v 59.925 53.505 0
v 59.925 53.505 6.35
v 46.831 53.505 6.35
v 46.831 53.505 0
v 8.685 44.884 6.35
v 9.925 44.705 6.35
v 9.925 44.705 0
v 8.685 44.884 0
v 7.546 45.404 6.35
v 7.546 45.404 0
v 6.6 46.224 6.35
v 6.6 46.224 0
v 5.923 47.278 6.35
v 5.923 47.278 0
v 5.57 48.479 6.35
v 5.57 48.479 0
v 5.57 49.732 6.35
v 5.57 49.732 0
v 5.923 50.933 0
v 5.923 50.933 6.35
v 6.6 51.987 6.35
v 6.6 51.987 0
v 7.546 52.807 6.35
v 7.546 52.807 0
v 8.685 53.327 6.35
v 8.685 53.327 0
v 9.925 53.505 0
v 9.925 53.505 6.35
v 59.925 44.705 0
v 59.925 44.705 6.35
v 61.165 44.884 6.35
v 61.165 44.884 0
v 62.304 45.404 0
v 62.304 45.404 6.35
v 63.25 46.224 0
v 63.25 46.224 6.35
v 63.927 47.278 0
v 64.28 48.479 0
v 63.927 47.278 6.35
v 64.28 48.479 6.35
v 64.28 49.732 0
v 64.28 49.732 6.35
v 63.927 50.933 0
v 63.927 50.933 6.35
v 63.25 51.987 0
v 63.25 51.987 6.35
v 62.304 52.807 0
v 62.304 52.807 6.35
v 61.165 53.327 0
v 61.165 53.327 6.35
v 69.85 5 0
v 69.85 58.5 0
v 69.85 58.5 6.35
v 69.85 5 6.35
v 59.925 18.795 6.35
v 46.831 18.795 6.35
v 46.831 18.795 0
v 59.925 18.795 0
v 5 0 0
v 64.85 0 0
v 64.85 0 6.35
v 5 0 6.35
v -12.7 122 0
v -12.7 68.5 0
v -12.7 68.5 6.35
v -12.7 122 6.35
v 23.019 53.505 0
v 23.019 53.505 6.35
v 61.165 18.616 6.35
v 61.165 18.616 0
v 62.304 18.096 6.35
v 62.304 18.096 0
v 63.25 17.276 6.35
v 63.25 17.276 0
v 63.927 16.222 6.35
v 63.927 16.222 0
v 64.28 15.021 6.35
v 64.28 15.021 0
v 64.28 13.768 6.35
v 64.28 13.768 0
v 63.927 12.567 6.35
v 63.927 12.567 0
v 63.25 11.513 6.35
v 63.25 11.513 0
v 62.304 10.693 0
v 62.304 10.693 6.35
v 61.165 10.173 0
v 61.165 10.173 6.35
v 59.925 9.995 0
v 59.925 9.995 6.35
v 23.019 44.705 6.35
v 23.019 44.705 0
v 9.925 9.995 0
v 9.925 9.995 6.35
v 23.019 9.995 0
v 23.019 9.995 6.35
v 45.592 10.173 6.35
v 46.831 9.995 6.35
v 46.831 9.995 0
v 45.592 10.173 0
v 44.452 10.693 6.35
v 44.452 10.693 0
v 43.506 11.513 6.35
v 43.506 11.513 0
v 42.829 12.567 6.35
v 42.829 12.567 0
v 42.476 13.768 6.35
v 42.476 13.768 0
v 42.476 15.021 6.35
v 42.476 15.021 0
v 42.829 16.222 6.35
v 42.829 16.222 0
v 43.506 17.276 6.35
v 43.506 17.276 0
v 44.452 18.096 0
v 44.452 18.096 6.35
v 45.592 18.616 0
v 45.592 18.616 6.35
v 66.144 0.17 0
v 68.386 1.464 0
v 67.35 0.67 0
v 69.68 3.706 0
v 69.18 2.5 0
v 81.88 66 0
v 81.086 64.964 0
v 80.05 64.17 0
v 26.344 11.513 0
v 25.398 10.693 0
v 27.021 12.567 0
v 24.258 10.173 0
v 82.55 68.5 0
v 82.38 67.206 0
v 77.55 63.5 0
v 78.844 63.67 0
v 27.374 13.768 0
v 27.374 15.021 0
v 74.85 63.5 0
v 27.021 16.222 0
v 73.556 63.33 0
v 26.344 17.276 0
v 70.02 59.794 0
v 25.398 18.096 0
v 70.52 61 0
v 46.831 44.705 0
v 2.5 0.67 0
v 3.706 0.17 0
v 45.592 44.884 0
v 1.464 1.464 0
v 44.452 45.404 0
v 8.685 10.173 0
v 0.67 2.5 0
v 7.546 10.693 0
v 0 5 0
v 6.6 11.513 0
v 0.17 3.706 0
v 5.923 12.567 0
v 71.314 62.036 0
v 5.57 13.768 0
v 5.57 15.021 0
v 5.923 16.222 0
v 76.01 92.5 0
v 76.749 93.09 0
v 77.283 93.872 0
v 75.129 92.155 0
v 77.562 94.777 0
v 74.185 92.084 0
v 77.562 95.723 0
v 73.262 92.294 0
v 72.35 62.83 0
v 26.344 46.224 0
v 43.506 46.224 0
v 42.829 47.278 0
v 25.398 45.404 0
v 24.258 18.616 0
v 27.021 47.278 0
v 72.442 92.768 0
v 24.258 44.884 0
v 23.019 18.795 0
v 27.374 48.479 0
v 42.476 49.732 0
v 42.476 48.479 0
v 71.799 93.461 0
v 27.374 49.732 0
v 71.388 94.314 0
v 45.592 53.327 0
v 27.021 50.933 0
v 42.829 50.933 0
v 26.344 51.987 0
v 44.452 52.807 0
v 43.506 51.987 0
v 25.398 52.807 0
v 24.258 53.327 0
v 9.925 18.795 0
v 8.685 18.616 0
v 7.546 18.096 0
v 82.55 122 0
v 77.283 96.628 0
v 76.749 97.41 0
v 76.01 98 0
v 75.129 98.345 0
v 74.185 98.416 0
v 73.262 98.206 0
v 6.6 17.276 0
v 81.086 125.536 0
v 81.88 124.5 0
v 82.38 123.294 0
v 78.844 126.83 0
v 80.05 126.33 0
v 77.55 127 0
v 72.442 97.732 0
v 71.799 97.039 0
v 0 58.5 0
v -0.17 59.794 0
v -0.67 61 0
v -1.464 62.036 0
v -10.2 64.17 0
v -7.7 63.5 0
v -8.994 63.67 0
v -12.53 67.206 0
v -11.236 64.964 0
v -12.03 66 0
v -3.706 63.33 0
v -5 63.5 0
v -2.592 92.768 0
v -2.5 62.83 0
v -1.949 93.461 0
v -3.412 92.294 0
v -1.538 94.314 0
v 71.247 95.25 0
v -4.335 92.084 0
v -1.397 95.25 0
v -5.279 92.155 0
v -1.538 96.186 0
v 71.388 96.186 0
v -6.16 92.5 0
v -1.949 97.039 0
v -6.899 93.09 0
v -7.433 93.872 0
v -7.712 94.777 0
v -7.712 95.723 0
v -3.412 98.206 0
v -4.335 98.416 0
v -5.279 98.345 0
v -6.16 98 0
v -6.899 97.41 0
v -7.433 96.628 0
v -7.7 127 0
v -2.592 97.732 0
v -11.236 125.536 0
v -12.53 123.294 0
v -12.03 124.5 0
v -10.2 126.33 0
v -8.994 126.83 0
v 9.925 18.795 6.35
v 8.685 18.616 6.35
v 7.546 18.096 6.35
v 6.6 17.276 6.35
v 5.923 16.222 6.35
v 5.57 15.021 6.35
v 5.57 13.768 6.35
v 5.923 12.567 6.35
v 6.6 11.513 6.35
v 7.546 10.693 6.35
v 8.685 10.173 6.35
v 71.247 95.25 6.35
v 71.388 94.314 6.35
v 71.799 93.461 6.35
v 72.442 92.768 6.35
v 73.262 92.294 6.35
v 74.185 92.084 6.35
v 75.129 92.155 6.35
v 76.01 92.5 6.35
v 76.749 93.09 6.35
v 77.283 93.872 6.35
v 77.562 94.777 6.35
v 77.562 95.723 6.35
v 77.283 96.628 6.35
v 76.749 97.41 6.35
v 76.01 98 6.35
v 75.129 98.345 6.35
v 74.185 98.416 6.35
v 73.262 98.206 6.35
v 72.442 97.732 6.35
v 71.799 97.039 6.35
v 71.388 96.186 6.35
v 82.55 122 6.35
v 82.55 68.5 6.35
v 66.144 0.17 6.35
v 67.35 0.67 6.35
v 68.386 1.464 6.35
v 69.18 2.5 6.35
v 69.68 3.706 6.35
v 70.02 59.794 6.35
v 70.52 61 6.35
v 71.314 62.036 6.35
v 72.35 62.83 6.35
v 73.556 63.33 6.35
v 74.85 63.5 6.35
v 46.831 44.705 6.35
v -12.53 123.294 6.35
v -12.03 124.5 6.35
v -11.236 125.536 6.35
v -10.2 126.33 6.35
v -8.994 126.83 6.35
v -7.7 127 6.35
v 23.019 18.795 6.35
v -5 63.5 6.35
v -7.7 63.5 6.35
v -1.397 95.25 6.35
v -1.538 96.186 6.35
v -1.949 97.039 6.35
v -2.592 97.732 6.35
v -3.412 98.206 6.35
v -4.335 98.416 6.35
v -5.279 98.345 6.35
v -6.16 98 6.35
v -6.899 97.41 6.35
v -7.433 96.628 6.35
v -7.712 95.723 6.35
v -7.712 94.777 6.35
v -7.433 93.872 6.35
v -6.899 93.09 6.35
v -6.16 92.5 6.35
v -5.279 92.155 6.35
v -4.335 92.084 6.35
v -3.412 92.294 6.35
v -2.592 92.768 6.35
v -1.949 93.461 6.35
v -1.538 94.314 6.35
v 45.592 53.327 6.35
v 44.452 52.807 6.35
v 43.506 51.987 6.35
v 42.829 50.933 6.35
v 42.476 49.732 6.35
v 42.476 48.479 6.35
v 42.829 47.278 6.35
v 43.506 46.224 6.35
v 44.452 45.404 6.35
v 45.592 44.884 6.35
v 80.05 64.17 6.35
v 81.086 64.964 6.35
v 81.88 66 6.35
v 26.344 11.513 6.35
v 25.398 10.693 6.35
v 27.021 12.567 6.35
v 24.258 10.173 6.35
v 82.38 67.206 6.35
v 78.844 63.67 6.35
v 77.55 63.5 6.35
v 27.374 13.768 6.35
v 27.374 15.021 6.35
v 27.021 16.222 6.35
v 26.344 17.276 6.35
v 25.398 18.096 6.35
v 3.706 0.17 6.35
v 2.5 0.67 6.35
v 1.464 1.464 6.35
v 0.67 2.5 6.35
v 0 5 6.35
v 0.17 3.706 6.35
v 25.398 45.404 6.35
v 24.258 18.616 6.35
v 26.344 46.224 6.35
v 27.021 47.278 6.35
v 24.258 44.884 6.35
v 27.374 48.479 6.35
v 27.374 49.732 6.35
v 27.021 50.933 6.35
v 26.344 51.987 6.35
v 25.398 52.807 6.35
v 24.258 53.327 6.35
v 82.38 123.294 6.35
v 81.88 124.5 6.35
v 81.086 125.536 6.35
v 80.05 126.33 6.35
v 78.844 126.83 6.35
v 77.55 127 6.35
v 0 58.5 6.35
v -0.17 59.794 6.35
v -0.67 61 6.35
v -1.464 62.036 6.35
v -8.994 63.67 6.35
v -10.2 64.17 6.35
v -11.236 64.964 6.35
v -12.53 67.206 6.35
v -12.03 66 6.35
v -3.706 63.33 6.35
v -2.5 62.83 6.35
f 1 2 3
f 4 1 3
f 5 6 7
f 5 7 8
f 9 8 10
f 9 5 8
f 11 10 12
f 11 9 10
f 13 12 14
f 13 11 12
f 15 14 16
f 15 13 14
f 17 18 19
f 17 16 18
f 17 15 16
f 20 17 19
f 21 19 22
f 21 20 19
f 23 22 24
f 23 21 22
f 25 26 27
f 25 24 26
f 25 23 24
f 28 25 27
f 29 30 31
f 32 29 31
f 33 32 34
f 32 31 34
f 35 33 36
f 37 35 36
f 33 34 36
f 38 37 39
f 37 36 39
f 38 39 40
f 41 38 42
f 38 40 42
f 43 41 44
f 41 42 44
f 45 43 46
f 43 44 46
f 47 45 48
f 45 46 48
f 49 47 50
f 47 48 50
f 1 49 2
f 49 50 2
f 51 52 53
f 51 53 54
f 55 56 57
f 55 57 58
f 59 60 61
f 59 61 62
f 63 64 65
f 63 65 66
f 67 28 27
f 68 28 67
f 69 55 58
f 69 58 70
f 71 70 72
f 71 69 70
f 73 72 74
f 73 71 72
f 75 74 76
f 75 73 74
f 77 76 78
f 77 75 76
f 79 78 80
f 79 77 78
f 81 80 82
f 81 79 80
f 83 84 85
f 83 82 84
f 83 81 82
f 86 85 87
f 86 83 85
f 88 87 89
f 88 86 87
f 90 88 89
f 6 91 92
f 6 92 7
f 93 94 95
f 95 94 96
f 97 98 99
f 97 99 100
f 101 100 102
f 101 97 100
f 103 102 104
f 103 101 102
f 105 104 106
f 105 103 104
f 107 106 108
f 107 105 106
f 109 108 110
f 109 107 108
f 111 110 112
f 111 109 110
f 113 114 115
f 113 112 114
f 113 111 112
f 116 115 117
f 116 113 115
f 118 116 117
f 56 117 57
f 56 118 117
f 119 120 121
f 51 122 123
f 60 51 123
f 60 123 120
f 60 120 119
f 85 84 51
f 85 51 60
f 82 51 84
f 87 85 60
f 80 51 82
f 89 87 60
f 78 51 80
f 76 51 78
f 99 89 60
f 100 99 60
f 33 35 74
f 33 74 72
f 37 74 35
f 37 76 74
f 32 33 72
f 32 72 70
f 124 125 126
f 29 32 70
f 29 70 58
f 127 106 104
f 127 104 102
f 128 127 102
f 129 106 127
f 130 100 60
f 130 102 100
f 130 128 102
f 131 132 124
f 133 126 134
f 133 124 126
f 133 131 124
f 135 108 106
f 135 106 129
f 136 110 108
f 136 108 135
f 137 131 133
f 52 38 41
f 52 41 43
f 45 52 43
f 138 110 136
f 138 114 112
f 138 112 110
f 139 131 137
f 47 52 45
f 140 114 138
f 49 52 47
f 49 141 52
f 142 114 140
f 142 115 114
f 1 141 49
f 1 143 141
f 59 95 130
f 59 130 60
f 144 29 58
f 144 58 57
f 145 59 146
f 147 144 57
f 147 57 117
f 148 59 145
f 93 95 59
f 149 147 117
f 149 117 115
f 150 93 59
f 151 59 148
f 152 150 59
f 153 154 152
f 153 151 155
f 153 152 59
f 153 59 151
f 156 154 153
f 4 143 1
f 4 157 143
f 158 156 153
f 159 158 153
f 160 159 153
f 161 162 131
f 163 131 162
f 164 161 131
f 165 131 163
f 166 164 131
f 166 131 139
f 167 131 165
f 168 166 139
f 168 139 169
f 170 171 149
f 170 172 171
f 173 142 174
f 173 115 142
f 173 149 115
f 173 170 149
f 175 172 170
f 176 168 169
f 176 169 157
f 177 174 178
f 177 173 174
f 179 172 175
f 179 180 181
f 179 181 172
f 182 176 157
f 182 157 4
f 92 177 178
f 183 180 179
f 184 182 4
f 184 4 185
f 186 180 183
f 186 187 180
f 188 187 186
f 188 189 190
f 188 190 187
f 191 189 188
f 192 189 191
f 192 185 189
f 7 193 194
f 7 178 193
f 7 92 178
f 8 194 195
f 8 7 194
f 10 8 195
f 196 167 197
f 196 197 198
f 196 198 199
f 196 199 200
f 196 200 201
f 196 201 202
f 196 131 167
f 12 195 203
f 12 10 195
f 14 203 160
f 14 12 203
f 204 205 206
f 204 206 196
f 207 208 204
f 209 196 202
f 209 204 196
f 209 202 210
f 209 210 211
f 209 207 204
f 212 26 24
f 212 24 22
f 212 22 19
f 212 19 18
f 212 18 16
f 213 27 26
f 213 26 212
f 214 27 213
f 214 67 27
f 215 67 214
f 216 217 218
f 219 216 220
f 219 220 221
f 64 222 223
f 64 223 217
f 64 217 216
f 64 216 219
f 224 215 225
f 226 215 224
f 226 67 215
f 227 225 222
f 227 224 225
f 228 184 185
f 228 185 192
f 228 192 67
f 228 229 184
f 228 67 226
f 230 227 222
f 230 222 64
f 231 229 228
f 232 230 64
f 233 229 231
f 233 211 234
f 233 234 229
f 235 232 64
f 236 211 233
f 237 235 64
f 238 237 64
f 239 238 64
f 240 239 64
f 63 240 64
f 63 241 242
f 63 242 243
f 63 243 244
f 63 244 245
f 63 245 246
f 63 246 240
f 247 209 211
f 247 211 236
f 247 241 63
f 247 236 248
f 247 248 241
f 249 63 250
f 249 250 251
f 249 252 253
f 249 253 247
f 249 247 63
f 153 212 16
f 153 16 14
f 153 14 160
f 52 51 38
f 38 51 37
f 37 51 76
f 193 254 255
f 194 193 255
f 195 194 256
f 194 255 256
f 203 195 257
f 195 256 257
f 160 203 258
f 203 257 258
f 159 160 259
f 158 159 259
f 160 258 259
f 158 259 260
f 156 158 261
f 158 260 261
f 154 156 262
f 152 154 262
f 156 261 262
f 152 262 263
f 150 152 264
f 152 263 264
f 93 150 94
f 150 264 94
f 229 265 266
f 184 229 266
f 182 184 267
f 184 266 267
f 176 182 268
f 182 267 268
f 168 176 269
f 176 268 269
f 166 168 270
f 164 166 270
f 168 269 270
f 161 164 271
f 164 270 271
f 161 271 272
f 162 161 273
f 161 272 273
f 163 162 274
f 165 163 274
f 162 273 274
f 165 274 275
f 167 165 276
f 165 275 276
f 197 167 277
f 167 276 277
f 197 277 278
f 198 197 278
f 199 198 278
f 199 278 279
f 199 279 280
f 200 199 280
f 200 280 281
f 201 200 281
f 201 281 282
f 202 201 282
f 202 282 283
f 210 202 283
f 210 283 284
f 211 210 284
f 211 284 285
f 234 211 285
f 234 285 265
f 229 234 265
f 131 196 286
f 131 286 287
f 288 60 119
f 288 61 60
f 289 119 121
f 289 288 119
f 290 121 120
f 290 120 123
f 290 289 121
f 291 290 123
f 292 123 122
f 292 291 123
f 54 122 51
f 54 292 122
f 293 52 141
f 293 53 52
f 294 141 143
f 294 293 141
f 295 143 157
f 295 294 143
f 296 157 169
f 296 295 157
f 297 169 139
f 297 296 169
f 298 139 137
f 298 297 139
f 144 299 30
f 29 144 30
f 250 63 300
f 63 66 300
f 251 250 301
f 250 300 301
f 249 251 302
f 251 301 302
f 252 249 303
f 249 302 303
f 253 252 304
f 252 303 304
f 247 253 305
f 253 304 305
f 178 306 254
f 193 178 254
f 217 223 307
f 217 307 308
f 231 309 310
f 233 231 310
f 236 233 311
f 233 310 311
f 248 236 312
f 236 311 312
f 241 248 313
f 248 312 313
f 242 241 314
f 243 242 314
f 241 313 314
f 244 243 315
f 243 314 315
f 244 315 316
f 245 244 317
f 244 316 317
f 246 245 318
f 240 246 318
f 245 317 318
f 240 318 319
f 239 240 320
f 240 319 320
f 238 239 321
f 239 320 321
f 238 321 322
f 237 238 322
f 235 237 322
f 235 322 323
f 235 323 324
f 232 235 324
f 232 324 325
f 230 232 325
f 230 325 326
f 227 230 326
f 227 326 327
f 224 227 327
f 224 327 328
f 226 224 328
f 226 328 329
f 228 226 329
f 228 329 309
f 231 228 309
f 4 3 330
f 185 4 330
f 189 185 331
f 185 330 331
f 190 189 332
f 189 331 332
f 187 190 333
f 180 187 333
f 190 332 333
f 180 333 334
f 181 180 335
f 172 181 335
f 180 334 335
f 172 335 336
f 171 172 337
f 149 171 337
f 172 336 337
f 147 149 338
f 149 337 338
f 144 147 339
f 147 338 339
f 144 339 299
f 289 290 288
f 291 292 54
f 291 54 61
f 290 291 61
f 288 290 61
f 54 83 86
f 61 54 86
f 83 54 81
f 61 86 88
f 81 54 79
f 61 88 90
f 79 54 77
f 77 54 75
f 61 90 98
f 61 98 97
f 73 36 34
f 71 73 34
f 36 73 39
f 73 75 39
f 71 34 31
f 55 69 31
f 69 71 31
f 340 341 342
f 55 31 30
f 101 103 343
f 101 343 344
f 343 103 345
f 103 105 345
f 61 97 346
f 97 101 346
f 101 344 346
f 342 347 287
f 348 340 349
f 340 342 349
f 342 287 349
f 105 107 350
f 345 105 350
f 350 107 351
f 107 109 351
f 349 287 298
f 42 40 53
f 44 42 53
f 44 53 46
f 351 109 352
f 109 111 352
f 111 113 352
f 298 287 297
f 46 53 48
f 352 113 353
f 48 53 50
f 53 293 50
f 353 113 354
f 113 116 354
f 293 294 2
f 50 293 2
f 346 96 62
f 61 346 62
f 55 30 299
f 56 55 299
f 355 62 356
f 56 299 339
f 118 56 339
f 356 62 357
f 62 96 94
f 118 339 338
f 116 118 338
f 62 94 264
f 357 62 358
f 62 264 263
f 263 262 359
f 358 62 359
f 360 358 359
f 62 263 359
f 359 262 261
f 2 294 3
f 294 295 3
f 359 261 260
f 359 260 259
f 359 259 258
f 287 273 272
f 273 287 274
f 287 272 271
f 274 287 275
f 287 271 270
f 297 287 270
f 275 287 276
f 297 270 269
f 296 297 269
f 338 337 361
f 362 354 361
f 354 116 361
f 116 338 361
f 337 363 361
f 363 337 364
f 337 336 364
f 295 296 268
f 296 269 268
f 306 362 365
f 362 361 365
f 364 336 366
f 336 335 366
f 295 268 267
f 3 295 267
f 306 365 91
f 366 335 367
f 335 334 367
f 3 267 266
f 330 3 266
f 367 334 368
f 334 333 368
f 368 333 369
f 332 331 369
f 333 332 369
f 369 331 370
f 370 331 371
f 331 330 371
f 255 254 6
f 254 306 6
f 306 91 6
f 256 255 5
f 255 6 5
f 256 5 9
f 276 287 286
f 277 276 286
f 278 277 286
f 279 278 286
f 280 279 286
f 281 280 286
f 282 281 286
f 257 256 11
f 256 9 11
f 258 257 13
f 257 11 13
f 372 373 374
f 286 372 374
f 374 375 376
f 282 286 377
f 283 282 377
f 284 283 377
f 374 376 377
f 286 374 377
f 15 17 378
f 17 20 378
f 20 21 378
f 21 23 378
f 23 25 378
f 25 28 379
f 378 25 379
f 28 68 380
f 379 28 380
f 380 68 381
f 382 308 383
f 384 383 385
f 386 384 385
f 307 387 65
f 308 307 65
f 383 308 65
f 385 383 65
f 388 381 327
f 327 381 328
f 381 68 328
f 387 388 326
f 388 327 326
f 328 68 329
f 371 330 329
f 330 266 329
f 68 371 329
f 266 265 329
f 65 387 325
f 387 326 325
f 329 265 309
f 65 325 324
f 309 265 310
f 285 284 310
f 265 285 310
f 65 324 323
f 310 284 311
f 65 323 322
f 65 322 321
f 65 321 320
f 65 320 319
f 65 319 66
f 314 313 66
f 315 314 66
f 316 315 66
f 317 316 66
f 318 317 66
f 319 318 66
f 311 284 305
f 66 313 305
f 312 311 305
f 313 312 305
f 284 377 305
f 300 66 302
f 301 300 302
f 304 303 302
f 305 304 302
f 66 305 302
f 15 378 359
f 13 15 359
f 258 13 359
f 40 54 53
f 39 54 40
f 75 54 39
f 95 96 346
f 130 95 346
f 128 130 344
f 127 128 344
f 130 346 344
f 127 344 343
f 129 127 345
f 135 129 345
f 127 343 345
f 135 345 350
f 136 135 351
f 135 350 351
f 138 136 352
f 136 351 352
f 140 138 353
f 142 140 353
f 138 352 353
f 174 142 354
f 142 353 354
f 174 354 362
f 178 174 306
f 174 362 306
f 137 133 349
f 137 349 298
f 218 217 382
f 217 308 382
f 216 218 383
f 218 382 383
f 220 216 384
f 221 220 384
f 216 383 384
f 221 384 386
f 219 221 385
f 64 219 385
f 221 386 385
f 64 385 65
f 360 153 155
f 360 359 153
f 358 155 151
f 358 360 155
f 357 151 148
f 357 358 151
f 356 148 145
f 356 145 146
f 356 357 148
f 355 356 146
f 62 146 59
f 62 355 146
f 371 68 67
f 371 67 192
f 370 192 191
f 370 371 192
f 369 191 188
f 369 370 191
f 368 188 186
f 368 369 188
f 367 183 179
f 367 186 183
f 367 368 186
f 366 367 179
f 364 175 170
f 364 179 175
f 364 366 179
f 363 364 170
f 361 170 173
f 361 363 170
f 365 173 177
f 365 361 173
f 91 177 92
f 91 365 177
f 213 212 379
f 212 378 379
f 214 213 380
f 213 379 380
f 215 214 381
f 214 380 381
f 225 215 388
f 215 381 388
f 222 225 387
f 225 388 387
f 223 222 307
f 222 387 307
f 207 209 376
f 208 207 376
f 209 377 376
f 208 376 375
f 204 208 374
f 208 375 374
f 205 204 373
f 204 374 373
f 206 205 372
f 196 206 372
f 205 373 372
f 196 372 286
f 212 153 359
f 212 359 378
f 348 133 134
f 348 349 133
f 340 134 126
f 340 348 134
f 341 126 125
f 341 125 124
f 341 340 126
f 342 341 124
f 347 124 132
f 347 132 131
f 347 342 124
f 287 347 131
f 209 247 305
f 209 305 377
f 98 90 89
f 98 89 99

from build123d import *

# Parameters (mm, degrees)
BOSS_EXTRUDE1_DEPTH = 6.35
CUT_EXTRUDE1_REACH  = 153.604
SKETCH2_R           = 3.175
CUT_EXTRUDE2_REACH  = 153.604
FILLET1_R           = 5


with BuildPart() as part:
    # Sketch1 → Boss-Extrude1 (new body)
    with BuildSketch(Plane.XY):
        Polygon((0, 0), (0, 63.5), (-12.7, 63.5), (-12.7, 127), (82.55, 127), (82.55, 63.5), (69.85, 63.5), (69.85, 0), align=None)
    extrude(amount=BOSS_EXTRUDE1_DEPTH)

    # Sketch2 → Cut-Extrude1 (cut, up to next)
    with BuildSketch(Plane.XY.offset(6.35), mode=Mode.PRIVATE) as cut_extrude1_sk1:
        with Locations((-4.572, 95.25)):
            Circle(SKETCH2_R)
    cut_extrude1_tool1 = extrude(cut_extrude1_sk1.sketch, amount=-CUT_EXTRUDE1_REACH, mode=Mode.PRIVATE) & part.part
    # Sketch2 → Cut-Extrude1 (cut, up to next)
    with BuildSketch(Plane.XY.offset(6.35), mode=Mode.PRIVATE) as cut_extrude1_sk2:
        with Locations(Location((74.422, 95.25, 0), (0, 0, 180))):
            Circle(SKETCH2_R)
    cut_extrude1_tool2 = extrude(cut_extrude1_sk2.sketch, amount=-CUT_EXTRUDE1_REACH, mode=Mode.PRIVATE) & part.part
    add(cut_extrude1_tool1.solids().sort_by_distance((-4.572, 95.25, 6.35))[0], mode=Mode.SUBTRACT)
    add(cut_extrude1_tool2.solids().sort_by_distance((74.422, 95.25, 6.35))[0], mode=Mode.SUBTRACT)

    # Sketch3 → Cut-Extrude2 (cut, up to next)
    with BuildSketch(Plane.XY.offset(6.35), mode=Mode.PRIVATE) as cut_extrude2_sk1:
        with BuildLine():
            Line((9.925, 53.50542107), (23.01875, 53.50542107))
            ThreePointArc((23.01875, 53.50542107), (27.41875, 49.10542107), (23.01875, 44.70542107))
            Line((23.01875, 44.70542107), (9.925, 44.70542107))
            ThreePointArc((9.925, 44.70542107), (5.525, 49.10542107), (9.925, 53.50542107))
        make_face()
    cut_extrude2_tool1 = extrude(cut_extrude2_sk1.sketch, amount=-CUT_EXTRUDE2_REACH, mode=Mode.PRIVATE) & part.part
    # Sketch3 → Cut-Extrude2 (cut, up to next)
    with BuildSketch(Plane.XY.offset(6.35), mode=Mode.PRIVATE) as cut_extrude2_sk2:
        with BuildLine():
            Line((59.925, 53.50542107), (46.83125, 53.50542107))
            ThreePointArc((46.83125, 53.50542107), (42.43125, 49.10542107), (46.83125, 44.70542107))
            Line((46.83125, 44.70542107), (59.925, 44.70542107))
            ThreePointArc((59.925, 44.70542107), (64.325, 49.10542107), (59.925, 53.50542107))
        make_face()
    cut_extrude2_tool2 = extrude(cut_extrude2_sk2.sketch, amount=-CUT_EXTRUDE2_REACH, mode=Mode.PRIVATE) & part.part
    # Sketch3 → Cut-Extrude2 (cut, up to next)
    with BuildSketch(Plane.XY.offset(6.35), mode=Mode.PRIVATE) as cut_extrude2_sk3:
        with BuildLine():
            Line((59.925, 9.99457893), (46.83125, 9.99457893))
            ThreePointArc((46.83125, 9.99457893), (42.43125, 14.39457893), (46.83125, 18.79457893))
            Line((46.83125, 18.79457893), (59.925, 18.79457893))
            ThreePointArc((59.925, 18.79457893), (64.325, 14.39457893), (59.925, 9.99457893))
        make_face()
    cut_extrude2_tool3 = extrude(cut_extrude2_sk3.sketch, amount=-CUT_EXTRUDE2_REACH, mode=Mode.PRIVATE) & part.part
    # Sketch3 → Cut-Extrude2 (cut, up to next)
    with BuildSketch(Plane.XY.offset(6.35), mode=Mode.PRIVATE) as cut_extrude2_sk4:
        with BuildLine():
            Line((9.925, 9.99457893), (23.01875, 9.99457893))
            ThreePointArc((23.01875, 9.99457893), (27.41875, 14.39457893), (23.01875, 18.79457893))
            Line((23.01875, 18.79457893), (9.925, 18.79457893))
            ThreePointArc((9.925, 18.79457893), (5.525, 14.39457893), (9.925, 9.99457893))
        make_face()
    cut_extrude2_tool4 = extrude(cut_extrude2_sk4.sketch, amount=-CUT_EXTRUDE2_REACH, mode=Mode.PRIVATE) & part.part
    add(cut_extrude2_tool1.solids().sort_by_distance((16.471875, 49.105421, 6.35))[0], mode=Mode.SUBTRACT)
    add(cut_extrude2_tool2.solids().sort_by_distance((53.378125, 49.105421, 6.35))[0], mode=Mode.SUBTRACT)
    add(cut_extrude2_tool3.solids().sort_by_distance((53.378125, 14.394579, 6.35))[0], mode=Mode.SUBTRACT)
    add(cut_extrude2_tool4.solids().sort_by_distance((16.471875, 14.394579, 6.35))[0], mode=Mode.SUBTRACT)

    # Fillet1
    fillet1_edges = [part.edges().sort_by_distance(p)[0] for p in [
        (0, 0, 3.175),
        (0, 63.5, 3.175),
        (-12.7, 63.5, 3.175),
        (-12.7, 127, 3.175),
        (82.55, 127, 3.175),
        (82.55, 63.5, 3.175),
        (69.85, 63.5, 3.175),
        (69.85, 0, 3.175),
    ]]
    fillet(fillet1_edges, radius=FILLET1_R)


solid = part.part
